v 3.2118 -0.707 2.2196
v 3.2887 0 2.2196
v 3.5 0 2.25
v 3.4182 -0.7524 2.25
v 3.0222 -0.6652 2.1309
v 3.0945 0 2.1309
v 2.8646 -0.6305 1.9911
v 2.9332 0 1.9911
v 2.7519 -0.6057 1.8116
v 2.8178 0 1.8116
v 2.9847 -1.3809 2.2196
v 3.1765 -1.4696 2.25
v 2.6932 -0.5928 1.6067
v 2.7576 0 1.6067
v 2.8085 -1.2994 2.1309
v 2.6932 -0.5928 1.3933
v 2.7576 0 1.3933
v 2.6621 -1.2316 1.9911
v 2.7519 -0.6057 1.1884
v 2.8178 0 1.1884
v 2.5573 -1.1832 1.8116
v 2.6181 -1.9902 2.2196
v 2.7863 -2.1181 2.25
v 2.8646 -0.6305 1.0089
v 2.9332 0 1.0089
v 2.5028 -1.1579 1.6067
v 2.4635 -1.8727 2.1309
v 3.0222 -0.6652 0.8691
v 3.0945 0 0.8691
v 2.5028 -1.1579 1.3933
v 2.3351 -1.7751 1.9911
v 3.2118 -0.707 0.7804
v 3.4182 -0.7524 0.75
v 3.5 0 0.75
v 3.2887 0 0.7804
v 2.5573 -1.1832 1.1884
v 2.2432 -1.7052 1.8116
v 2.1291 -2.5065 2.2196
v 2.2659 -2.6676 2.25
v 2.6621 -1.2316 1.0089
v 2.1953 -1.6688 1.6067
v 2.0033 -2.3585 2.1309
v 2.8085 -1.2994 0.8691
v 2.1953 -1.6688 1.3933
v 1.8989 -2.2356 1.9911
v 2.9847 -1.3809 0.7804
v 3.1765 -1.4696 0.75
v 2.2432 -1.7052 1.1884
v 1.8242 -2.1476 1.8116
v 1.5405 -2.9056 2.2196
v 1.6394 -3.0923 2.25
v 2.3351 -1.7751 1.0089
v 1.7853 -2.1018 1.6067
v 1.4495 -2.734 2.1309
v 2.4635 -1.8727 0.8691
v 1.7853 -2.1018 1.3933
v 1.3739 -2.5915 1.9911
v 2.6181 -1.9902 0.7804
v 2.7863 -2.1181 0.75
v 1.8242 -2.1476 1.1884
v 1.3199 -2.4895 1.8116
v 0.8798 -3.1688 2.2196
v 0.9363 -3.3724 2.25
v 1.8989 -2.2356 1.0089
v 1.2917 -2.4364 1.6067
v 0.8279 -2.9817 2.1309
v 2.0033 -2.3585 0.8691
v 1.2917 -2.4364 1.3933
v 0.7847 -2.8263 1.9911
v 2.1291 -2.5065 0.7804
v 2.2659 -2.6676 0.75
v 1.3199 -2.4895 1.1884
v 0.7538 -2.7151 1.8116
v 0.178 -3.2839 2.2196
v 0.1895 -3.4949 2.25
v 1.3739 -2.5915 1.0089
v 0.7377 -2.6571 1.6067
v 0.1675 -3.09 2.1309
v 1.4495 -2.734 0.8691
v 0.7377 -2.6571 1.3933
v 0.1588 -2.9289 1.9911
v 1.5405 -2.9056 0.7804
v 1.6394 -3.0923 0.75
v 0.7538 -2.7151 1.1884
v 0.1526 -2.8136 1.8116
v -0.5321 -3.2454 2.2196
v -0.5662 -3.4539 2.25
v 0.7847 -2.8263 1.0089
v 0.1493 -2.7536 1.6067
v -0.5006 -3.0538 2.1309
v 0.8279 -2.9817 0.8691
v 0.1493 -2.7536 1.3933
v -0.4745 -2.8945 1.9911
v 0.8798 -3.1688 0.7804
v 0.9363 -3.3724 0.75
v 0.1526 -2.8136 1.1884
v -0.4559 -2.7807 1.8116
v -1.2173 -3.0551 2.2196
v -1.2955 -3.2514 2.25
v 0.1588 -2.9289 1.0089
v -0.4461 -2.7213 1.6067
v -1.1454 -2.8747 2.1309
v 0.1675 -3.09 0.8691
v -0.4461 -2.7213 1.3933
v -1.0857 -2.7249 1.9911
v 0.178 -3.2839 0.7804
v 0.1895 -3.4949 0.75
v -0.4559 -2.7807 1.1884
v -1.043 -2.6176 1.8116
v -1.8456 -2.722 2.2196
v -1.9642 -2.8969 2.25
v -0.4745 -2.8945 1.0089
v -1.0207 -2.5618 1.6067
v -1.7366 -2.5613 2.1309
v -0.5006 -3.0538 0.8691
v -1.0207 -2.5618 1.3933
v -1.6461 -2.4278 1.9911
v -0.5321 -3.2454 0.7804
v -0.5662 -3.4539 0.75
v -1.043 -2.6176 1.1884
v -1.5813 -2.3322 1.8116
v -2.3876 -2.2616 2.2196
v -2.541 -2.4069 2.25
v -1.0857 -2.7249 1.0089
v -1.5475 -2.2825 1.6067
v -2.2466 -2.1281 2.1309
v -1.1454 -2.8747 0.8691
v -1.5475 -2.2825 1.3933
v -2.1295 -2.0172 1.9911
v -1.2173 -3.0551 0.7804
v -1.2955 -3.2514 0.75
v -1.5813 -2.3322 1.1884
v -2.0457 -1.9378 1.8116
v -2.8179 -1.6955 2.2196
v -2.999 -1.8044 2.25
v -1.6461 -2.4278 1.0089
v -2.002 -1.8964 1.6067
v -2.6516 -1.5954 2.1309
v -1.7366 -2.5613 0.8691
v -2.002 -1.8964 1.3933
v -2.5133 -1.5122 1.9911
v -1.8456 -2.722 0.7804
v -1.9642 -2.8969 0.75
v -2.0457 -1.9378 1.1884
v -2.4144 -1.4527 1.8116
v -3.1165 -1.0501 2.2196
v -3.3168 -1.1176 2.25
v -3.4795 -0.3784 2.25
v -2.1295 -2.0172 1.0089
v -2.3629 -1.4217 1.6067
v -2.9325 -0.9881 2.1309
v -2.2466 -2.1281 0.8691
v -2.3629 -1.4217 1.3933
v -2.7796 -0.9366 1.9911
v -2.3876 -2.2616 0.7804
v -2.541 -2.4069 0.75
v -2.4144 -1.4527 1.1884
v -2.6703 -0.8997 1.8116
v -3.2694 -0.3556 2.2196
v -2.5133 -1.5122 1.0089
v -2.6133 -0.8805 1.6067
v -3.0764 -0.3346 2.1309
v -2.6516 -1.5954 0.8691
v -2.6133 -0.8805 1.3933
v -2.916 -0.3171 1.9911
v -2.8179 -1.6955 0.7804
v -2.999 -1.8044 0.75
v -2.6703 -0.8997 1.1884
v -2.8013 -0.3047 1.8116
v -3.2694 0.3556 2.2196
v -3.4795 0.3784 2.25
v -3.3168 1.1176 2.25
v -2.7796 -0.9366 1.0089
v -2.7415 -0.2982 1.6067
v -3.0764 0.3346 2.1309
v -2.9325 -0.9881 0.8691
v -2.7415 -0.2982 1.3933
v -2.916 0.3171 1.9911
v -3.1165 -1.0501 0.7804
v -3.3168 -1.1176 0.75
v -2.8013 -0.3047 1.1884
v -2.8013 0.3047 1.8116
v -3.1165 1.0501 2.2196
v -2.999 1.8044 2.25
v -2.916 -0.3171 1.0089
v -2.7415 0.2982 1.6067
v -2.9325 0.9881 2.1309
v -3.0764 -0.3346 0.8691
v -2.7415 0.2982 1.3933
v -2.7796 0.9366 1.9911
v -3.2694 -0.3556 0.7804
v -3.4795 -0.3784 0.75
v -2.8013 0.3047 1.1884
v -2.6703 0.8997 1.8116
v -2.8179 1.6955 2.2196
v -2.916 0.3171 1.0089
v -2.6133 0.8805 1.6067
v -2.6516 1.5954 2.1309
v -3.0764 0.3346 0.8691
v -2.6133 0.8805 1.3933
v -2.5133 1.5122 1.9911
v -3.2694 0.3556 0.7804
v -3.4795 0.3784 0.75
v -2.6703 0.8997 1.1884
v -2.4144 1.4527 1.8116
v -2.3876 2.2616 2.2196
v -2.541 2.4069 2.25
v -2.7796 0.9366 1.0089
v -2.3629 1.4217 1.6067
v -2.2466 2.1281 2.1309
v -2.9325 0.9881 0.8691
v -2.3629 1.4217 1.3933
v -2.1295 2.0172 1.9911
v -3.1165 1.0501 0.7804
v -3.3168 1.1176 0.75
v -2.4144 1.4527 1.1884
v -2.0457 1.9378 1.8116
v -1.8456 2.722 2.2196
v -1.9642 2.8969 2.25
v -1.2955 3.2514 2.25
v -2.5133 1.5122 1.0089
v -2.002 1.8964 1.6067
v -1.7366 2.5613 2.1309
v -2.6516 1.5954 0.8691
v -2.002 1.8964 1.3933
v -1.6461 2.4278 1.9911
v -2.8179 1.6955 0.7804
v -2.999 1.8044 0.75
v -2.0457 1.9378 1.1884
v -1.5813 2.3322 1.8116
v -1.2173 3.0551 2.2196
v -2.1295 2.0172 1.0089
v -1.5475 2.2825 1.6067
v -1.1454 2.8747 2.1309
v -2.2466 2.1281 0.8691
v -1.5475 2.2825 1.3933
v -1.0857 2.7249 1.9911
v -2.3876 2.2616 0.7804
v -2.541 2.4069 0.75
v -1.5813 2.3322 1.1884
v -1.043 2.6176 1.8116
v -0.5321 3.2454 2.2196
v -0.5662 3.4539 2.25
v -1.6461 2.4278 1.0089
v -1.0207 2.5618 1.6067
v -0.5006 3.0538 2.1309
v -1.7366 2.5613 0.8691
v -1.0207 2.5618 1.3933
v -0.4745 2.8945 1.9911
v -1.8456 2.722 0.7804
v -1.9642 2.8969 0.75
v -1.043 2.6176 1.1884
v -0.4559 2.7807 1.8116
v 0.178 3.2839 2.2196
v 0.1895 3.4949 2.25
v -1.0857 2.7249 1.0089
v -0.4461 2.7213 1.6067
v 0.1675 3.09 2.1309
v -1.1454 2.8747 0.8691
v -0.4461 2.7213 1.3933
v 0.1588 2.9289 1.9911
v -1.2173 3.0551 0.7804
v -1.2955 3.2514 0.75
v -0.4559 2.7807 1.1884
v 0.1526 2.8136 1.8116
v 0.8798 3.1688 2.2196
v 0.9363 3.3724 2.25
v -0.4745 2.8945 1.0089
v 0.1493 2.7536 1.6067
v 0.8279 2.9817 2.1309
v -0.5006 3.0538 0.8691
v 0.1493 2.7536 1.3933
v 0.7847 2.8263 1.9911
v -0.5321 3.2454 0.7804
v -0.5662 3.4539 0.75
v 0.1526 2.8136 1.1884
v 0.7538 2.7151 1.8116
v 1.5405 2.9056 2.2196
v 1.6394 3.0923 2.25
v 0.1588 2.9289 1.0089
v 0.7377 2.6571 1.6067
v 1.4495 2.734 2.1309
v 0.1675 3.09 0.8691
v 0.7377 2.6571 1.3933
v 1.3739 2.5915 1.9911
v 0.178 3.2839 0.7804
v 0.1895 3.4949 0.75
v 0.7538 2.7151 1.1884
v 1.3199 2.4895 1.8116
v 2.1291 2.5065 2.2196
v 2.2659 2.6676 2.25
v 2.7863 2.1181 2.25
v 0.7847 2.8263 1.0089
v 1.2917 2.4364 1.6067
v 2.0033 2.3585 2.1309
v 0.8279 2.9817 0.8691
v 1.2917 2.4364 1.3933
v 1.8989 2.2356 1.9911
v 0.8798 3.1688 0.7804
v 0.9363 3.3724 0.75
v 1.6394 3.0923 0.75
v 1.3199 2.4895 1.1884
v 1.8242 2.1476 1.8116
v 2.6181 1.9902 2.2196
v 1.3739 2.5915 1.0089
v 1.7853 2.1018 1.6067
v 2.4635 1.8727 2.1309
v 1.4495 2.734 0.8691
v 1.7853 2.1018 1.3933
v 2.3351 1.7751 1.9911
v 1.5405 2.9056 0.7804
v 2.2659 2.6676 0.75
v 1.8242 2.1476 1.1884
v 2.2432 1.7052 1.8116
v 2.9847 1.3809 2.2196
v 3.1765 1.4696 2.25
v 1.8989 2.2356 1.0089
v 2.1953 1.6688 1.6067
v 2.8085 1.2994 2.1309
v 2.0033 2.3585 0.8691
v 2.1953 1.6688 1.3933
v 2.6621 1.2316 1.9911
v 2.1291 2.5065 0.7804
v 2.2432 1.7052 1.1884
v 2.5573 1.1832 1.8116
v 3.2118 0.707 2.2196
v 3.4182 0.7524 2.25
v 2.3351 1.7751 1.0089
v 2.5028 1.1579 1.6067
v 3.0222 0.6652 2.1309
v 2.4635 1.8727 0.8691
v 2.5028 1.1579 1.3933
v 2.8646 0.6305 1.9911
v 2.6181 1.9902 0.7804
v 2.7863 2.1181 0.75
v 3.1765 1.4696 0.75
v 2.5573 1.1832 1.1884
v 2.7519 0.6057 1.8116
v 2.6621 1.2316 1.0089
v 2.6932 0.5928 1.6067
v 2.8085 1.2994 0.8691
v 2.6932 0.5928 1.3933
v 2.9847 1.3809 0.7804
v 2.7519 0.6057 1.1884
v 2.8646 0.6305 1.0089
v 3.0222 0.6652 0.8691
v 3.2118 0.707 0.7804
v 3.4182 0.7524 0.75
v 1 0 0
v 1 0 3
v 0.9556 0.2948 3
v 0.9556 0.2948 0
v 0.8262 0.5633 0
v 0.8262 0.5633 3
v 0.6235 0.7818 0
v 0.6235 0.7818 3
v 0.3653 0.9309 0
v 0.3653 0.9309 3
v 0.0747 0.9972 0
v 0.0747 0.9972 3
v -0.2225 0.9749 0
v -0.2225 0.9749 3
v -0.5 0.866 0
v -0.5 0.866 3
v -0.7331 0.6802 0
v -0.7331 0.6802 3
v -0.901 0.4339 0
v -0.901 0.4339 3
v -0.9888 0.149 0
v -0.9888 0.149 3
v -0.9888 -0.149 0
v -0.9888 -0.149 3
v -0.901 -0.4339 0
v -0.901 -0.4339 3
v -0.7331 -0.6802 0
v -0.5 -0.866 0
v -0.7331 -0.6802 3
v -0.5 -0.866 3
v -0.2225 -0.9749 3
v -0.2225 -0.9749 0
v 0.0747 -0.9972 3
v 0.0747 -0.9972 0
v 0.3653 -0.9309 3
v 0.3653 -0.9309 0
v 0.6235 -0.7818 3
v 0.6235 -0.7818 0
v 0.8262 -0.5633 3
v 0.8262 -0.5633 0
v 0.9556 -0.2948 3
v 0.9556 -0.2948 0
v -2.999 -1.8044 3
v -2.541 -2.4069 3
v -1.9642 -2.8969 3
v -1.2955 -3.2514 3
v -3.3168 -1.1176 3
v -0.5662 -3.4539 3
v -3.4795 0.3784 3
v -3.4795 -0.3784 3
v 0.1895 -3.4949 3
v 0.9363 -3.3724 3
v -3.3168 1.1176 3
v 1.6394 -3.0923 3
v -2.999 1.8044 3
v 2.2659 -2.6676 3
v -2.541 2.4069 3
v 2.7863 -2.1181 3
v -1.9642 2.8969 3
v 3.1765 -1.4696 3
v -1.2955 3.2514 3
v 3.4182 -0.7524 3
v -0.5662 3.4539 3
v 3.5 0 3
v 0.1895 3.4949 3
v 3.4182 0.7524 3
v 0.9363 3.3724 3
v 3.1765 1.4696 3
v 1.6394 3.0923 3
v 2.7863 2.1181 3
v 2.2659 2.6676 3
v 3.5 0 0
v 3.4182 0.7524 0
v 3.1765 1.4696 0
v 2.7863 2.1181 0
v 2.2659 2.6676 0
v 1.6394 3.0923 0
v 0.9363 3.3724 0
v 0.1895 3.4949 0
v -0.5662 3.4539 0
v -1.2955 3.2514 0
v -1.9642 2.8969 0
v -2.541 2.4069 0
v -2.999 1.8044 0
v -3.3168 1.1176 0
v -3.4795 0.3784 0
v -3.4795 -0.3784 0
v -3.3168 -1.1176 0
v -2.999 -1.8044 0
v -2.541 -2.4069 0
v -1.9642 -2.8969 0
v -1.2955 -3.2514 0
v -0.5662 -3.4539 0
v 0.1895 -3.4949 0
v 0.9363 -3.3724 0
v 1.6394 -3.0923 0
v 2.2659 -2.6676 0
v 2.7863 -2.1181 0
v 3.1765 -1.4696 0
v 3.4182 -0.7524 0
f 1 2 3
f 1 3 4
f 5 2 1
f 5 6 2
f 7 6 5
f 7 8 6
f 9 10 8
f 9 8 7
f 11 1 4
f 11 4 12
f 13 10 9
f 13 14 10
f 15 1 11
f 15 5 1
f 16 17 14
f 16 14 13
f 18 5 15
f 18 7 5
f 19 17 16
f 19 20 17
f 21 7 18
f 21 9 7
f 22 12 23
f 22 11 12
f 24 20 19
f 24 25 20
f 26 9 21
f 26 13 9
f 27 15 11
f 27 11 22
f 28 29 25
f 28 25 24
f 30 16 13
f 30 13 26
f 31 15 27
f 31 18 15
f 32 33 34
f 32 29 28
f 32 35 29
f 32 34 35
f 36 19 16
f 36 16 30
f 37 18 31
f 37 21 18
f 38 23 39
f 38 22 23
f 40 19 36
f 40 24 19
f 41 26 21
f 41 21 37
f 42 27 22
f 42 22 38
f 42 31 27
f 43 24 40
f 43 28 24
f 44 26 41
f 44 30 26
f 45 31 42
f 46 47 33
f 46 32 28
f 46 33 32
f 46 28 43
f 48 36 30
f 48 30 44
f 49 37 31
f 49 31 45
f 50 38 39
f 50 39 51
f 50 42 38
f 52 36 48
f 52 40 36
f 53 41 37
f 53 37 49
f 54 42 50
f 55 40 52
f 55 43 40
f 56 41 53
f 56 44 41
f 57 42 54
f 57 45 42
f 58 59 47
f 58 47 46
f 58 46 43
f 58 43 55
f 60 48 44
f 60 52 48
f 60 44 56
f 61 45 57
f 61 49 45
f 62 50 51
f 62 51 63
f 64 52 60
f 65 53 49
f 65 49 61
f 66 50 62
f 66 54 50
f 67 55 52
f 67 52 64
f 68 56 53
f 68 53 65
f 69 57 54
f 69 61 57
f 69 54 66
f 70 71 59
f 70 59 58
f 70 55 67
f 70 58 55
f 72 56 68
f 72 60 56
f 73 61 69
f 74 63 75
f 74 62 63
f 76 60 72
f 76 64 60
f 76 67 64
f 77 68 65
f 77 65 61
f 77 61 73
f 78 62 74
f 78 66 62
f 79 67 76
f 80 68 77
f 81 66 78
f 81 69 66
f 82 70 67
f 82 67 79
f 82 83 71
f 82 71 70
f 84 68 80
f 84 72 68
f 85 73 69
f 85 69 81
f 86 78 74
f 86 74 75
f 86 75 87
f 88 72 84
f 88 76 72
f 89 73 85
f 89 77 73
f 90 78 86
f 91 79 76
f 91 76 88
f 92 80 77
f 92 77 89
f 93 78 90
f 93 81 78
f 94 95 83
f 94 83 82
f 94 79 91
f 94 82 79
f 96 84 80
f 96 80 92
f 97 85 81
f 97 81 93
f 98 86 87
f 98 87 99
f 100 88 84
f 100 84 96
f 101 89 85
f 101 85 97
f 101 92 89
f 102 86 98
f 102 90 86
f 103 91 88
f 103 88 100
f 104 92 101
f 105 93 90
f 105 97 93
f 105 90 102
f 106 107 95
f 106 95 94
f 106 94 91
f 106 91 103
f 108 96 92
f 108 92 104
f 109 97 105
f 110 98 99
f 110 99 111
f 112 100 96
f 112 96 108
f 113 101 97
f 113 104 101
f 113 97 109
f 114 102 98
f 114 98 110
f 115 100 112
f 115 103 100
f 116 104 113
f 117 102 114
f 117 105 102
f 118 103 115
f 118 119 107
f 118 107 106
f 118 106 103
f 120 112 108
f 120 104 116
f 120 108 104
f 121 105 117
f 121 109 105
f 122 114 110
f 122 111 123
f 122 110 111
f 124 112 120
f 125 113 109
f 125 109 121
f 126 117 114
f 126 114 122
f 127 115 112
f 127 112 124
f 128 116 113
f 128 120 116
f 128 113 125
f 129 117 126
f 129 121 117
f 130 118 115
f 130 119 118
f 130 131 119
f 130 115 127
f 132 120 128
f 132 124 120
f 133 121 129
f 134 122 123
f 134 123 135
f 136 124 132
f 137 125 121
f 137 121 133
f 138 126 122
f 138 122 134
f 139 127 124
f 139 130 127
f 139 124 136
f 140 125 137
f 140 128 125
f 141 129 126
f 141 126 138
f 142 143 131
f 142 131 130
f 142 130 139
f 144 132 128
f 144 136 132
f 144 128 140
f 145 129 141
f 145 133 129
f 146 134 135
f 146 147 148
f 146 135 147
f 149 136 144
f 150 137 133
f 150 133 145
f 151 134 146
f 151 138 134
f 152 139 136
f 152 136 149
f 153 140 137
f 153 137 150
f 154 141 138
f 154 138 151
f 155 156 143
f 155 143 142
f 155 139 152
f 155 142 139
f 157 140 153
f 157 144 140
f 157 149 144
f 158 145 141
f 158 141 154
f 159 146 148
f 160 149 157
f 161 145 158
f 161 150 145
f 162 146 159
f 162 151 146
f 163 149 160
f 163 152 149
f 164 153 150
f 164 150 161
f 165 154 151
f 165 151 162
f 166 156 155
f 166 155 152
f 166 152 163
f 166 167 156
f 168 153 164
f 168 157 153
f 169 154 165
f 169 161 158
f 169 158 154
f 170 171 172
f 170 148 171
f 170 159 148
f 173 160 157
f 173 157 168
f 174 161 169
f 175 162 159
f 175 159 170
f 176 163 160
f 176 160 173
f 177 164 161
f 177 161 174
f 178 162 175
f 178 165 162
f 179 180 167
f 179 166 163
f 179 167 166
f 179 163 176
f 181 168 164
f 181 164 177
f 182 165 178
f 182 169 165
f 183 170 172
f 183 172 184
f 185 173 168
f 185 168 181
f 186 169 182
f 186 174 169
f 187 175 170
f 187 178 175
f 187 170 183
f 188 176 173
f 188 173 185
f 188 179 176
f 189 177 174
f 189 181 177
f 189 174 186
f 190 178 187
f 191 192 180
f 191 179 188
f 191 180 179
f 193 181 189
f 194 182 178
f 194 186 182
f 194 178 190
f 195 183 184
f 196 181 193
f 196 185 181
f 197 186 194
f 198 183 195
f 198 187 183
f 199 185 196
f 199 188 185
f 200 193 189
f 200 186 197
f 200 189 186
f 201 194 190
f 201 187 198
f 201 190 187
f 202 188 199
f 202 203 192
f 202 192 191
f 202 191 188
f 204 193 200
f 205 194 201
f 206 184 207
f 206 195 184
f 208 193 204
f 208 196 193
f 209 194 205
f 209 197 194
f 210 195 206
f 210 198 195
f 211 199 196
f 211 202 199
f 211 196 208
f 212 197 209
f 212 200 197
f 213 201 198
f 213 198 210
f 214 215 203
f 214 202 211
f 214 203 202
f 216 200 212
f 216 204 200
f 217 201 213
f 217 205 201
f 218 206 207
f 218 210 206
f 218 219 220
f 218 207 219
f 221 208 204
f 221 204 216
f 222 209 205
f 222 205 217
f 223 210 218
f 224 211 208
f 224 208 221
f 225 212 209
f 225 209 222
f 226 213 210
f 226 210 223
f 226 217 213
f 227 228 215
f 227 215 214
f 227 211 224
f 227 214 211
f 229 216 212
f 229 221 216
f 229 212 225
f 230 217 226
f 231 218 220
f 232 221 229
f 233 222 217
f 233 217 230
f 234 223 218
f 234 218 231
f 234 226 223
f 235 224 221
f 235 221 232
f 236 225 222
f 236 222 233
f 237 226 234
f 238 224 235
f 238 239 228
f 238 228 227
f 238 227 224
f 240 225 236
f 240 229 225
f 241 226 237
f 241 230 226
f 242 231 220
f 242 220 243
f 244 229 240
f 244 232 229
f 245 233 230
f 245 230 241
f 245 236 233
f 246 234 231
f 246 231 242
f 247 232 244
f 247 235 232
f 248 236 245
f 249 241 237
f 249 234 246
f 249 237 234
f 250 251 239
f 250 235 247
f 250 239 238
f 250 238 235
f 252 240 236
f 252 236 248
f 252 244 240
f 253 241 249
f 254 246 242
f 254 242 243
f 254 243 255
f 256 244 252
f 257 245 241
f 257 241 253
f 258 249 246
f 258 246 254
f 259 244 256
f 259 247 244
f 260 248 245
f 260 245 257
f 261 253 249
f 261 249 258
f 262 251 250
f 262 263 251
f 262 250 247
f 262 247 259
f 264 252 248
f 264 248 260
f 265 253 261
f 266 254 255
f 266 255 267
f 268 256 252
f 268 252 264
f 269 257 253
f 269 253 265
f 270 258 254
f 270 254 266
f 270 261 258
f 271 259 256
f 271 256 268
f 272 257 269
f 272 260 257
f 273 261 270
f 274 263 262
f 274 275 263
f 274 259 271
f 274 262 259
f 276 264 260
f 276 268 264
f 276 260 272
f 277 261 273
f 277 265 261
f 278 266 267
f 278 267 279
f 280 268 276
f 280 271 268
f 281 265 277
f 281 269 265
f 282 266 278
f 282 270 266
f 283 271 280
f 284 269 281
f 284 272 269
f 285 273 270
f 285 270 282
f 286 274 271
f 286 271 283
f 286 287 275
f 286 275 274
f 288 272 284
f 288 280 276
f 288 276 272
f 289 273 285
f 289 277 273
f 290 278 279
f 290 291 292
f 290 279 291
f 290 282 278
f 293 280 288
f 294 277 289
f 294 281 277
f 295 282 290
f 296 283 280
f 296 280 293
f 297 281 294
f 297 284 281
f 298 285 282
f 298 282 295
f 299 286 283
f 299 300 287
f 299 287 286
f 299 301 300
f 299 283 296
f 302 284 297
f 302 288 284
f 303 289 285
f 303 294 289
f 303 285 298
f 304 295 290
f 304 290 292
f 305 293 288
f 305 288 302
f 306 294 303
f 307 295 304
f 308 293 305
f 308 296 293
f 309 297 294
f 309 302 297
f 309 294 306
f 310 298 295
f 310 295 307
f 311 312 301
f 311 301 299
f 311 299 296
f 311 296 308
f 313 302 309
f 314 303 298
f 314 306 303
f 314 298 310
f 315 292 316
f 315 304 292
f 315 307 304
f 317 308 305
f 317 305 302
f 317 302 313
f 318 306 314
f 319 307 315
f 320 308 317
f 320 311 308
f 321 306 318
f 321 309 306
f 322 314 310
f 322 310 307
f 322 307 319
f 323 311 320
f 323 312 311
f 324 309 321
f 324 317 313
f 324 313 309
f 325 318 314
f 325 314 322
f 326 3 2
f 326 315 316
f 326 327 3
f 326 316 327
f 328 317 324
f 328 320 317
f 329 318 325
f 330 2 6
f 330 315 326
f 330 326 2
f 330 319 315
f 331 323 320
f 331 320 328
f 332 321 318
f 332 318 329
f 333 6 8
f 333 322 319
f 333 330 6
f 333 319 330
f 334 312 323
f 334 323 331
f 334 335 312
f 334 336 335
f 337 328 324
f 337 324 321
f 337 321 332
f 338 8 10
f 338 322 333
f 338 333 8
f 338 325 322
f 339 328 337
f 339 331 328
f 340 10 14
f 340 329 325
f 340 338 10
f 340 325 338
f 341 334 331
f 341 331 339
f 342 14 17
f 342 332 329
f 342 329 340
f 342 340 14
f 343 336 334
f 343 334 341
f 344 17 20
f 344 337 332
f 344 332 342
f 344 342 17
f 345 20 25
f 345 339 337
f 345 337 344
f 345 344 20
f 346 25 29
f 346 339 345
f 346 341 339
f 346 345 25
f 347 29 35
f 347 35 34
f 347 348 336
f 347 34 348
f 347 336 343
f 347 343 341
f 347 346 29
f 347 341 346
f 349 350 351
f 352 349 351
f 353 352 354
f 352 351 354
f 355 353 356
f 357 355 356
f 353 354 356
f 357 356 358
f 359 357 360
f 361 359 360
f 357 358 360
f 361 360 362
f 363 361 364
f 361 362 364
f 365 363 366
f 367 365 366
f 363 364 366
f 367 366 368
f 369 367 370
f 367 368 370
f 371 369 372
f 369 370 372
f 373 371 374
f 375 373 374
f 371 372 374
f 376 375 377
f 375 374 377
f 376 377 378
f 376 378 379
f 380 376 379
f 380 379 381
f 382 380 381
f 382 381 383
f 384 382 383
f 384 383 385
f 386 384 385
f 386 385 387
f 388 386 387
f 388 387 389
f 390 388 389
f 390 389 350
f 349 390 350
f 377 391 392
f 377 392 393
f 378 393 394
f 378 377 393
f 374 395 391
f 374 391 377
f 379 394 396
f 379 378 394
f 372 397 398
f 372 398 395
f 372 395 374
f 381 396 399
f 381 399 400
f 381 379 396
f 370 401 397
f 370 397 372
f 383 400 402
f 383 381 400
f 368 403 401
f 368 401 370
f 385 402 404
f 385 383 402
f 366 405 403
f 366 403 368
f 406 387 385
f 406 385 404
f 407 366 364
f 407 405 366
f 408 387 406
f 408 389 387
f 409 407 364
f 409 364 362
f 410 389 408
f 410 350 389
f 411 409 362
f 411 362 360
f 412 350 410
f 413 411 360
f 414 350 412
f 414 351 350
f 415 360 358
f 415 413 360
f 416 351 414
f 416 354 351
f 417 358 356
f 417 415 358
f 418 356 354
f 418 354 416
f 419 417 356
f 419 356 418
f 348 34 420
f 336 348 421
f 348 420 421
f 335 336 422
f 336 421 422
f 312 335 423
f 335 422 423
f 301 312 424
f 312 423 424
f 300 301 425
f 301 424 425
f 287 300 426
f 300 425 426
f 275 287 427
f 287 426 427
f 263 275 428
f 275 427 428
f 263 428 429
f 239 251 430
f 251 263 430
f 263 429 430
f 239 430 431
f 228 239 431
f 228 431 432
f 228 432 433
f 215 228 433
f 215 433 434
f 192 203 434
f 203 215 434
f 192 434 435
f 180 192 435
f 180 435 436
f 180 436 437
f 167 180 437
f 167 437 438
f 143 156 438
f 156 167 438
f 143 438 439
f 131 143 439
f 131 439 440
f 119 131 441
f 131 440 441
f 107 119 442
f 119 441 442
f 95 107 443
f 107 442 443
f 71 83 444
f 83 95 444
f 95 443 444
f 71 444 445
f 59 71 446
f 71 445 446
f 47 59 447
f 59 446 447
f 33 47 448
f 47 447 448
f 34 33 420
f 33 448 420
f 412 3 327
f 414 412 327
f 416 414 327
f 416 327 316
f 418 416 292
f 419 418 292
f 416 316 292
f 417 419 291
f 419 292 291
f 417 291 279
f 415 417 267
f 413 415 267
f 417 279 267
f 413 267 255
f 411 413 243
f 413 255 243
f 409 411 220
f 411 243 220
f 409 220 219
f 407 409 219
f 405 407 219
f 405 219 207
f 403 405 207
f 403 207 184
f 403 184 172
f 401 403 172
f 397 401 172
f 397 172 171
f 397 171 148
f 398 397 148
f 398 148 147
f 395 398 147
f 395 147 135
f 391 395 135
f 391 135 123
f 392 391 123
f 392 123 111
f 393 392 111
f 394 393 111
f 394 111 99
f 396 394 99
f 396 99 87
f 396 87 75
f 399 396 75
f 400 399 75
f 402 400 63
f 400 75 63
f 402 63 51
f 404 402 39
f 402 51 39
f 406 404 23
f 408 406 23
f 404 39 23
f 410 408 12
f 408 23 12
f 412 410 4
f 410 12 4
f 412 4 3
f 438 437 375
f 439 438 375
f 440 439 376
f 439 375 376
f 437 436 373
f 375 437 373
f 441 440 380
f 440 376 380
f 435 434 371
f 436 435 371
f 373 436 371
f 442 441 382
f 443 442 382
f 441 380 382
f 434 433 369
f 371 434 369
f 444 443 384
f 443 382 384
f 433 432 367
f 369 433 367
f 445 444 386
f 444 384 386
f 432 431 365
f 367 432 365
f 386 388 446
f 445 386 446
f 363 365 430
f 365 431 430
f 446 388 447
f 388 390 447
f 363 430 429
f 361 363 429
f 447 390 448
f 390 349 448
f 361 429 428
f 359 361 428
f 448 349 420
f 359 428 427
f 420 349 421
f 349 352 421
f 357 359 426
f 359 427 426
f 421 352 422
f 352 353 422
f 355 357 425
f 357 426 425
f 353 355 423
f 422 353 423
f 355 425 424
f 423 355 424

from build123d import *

# Parameters (mm, degrees)
CROQUIS1_R              = 3.5
SALIENTE_EXTRUIR1_DEPTH = 3
CROQUIS2_R              = 0.75
CROQUIS3_R              = 1
CORTAR_EXTRUIR1_DEPTH   = 6.787918451


with BuildPart() as part:
    # Croquis1 → Saliente-Extruir1 (new body)
    with BuildSketch(Plane.XY):
        Circle(CROQUIS1_R)
    extrude(amount=SALIENTE_EXTRUIR1_DEPTH)

    # Croquis2 → Cortar-Revolución1 (revolve, cut)
    with BuildSketch(Plane(origin=(0, 0, 0), x_dir=(0, 0, -1), z_dir=(1, 0, 0)), mode=Mode.PRIVATE) as cortar_revoluci_n1_sk:
        with Locations((-1.5, 3.5)):
            Circle(CROQUIS2_R)
    revolve(cortar_revoluci_n1_sk.sketch.rotate(Axis((0, 0, 3), (0, 0, -1)), 90), axis=Axis((0, 0, 3), (0, 0, -1)), mode=Mode.SUBTRACT)

    # Croquis3 → Cortar-Extruir1 (cut, through all)
    with BuildSketch(Plane.XY.offset(3)):
        Circle(CROQUIS3_R)
    extrude(amount=-CORTAR_EXTRUIR1_DEPTH, mode=Mode.SUBTRACT)


solid = part.part
